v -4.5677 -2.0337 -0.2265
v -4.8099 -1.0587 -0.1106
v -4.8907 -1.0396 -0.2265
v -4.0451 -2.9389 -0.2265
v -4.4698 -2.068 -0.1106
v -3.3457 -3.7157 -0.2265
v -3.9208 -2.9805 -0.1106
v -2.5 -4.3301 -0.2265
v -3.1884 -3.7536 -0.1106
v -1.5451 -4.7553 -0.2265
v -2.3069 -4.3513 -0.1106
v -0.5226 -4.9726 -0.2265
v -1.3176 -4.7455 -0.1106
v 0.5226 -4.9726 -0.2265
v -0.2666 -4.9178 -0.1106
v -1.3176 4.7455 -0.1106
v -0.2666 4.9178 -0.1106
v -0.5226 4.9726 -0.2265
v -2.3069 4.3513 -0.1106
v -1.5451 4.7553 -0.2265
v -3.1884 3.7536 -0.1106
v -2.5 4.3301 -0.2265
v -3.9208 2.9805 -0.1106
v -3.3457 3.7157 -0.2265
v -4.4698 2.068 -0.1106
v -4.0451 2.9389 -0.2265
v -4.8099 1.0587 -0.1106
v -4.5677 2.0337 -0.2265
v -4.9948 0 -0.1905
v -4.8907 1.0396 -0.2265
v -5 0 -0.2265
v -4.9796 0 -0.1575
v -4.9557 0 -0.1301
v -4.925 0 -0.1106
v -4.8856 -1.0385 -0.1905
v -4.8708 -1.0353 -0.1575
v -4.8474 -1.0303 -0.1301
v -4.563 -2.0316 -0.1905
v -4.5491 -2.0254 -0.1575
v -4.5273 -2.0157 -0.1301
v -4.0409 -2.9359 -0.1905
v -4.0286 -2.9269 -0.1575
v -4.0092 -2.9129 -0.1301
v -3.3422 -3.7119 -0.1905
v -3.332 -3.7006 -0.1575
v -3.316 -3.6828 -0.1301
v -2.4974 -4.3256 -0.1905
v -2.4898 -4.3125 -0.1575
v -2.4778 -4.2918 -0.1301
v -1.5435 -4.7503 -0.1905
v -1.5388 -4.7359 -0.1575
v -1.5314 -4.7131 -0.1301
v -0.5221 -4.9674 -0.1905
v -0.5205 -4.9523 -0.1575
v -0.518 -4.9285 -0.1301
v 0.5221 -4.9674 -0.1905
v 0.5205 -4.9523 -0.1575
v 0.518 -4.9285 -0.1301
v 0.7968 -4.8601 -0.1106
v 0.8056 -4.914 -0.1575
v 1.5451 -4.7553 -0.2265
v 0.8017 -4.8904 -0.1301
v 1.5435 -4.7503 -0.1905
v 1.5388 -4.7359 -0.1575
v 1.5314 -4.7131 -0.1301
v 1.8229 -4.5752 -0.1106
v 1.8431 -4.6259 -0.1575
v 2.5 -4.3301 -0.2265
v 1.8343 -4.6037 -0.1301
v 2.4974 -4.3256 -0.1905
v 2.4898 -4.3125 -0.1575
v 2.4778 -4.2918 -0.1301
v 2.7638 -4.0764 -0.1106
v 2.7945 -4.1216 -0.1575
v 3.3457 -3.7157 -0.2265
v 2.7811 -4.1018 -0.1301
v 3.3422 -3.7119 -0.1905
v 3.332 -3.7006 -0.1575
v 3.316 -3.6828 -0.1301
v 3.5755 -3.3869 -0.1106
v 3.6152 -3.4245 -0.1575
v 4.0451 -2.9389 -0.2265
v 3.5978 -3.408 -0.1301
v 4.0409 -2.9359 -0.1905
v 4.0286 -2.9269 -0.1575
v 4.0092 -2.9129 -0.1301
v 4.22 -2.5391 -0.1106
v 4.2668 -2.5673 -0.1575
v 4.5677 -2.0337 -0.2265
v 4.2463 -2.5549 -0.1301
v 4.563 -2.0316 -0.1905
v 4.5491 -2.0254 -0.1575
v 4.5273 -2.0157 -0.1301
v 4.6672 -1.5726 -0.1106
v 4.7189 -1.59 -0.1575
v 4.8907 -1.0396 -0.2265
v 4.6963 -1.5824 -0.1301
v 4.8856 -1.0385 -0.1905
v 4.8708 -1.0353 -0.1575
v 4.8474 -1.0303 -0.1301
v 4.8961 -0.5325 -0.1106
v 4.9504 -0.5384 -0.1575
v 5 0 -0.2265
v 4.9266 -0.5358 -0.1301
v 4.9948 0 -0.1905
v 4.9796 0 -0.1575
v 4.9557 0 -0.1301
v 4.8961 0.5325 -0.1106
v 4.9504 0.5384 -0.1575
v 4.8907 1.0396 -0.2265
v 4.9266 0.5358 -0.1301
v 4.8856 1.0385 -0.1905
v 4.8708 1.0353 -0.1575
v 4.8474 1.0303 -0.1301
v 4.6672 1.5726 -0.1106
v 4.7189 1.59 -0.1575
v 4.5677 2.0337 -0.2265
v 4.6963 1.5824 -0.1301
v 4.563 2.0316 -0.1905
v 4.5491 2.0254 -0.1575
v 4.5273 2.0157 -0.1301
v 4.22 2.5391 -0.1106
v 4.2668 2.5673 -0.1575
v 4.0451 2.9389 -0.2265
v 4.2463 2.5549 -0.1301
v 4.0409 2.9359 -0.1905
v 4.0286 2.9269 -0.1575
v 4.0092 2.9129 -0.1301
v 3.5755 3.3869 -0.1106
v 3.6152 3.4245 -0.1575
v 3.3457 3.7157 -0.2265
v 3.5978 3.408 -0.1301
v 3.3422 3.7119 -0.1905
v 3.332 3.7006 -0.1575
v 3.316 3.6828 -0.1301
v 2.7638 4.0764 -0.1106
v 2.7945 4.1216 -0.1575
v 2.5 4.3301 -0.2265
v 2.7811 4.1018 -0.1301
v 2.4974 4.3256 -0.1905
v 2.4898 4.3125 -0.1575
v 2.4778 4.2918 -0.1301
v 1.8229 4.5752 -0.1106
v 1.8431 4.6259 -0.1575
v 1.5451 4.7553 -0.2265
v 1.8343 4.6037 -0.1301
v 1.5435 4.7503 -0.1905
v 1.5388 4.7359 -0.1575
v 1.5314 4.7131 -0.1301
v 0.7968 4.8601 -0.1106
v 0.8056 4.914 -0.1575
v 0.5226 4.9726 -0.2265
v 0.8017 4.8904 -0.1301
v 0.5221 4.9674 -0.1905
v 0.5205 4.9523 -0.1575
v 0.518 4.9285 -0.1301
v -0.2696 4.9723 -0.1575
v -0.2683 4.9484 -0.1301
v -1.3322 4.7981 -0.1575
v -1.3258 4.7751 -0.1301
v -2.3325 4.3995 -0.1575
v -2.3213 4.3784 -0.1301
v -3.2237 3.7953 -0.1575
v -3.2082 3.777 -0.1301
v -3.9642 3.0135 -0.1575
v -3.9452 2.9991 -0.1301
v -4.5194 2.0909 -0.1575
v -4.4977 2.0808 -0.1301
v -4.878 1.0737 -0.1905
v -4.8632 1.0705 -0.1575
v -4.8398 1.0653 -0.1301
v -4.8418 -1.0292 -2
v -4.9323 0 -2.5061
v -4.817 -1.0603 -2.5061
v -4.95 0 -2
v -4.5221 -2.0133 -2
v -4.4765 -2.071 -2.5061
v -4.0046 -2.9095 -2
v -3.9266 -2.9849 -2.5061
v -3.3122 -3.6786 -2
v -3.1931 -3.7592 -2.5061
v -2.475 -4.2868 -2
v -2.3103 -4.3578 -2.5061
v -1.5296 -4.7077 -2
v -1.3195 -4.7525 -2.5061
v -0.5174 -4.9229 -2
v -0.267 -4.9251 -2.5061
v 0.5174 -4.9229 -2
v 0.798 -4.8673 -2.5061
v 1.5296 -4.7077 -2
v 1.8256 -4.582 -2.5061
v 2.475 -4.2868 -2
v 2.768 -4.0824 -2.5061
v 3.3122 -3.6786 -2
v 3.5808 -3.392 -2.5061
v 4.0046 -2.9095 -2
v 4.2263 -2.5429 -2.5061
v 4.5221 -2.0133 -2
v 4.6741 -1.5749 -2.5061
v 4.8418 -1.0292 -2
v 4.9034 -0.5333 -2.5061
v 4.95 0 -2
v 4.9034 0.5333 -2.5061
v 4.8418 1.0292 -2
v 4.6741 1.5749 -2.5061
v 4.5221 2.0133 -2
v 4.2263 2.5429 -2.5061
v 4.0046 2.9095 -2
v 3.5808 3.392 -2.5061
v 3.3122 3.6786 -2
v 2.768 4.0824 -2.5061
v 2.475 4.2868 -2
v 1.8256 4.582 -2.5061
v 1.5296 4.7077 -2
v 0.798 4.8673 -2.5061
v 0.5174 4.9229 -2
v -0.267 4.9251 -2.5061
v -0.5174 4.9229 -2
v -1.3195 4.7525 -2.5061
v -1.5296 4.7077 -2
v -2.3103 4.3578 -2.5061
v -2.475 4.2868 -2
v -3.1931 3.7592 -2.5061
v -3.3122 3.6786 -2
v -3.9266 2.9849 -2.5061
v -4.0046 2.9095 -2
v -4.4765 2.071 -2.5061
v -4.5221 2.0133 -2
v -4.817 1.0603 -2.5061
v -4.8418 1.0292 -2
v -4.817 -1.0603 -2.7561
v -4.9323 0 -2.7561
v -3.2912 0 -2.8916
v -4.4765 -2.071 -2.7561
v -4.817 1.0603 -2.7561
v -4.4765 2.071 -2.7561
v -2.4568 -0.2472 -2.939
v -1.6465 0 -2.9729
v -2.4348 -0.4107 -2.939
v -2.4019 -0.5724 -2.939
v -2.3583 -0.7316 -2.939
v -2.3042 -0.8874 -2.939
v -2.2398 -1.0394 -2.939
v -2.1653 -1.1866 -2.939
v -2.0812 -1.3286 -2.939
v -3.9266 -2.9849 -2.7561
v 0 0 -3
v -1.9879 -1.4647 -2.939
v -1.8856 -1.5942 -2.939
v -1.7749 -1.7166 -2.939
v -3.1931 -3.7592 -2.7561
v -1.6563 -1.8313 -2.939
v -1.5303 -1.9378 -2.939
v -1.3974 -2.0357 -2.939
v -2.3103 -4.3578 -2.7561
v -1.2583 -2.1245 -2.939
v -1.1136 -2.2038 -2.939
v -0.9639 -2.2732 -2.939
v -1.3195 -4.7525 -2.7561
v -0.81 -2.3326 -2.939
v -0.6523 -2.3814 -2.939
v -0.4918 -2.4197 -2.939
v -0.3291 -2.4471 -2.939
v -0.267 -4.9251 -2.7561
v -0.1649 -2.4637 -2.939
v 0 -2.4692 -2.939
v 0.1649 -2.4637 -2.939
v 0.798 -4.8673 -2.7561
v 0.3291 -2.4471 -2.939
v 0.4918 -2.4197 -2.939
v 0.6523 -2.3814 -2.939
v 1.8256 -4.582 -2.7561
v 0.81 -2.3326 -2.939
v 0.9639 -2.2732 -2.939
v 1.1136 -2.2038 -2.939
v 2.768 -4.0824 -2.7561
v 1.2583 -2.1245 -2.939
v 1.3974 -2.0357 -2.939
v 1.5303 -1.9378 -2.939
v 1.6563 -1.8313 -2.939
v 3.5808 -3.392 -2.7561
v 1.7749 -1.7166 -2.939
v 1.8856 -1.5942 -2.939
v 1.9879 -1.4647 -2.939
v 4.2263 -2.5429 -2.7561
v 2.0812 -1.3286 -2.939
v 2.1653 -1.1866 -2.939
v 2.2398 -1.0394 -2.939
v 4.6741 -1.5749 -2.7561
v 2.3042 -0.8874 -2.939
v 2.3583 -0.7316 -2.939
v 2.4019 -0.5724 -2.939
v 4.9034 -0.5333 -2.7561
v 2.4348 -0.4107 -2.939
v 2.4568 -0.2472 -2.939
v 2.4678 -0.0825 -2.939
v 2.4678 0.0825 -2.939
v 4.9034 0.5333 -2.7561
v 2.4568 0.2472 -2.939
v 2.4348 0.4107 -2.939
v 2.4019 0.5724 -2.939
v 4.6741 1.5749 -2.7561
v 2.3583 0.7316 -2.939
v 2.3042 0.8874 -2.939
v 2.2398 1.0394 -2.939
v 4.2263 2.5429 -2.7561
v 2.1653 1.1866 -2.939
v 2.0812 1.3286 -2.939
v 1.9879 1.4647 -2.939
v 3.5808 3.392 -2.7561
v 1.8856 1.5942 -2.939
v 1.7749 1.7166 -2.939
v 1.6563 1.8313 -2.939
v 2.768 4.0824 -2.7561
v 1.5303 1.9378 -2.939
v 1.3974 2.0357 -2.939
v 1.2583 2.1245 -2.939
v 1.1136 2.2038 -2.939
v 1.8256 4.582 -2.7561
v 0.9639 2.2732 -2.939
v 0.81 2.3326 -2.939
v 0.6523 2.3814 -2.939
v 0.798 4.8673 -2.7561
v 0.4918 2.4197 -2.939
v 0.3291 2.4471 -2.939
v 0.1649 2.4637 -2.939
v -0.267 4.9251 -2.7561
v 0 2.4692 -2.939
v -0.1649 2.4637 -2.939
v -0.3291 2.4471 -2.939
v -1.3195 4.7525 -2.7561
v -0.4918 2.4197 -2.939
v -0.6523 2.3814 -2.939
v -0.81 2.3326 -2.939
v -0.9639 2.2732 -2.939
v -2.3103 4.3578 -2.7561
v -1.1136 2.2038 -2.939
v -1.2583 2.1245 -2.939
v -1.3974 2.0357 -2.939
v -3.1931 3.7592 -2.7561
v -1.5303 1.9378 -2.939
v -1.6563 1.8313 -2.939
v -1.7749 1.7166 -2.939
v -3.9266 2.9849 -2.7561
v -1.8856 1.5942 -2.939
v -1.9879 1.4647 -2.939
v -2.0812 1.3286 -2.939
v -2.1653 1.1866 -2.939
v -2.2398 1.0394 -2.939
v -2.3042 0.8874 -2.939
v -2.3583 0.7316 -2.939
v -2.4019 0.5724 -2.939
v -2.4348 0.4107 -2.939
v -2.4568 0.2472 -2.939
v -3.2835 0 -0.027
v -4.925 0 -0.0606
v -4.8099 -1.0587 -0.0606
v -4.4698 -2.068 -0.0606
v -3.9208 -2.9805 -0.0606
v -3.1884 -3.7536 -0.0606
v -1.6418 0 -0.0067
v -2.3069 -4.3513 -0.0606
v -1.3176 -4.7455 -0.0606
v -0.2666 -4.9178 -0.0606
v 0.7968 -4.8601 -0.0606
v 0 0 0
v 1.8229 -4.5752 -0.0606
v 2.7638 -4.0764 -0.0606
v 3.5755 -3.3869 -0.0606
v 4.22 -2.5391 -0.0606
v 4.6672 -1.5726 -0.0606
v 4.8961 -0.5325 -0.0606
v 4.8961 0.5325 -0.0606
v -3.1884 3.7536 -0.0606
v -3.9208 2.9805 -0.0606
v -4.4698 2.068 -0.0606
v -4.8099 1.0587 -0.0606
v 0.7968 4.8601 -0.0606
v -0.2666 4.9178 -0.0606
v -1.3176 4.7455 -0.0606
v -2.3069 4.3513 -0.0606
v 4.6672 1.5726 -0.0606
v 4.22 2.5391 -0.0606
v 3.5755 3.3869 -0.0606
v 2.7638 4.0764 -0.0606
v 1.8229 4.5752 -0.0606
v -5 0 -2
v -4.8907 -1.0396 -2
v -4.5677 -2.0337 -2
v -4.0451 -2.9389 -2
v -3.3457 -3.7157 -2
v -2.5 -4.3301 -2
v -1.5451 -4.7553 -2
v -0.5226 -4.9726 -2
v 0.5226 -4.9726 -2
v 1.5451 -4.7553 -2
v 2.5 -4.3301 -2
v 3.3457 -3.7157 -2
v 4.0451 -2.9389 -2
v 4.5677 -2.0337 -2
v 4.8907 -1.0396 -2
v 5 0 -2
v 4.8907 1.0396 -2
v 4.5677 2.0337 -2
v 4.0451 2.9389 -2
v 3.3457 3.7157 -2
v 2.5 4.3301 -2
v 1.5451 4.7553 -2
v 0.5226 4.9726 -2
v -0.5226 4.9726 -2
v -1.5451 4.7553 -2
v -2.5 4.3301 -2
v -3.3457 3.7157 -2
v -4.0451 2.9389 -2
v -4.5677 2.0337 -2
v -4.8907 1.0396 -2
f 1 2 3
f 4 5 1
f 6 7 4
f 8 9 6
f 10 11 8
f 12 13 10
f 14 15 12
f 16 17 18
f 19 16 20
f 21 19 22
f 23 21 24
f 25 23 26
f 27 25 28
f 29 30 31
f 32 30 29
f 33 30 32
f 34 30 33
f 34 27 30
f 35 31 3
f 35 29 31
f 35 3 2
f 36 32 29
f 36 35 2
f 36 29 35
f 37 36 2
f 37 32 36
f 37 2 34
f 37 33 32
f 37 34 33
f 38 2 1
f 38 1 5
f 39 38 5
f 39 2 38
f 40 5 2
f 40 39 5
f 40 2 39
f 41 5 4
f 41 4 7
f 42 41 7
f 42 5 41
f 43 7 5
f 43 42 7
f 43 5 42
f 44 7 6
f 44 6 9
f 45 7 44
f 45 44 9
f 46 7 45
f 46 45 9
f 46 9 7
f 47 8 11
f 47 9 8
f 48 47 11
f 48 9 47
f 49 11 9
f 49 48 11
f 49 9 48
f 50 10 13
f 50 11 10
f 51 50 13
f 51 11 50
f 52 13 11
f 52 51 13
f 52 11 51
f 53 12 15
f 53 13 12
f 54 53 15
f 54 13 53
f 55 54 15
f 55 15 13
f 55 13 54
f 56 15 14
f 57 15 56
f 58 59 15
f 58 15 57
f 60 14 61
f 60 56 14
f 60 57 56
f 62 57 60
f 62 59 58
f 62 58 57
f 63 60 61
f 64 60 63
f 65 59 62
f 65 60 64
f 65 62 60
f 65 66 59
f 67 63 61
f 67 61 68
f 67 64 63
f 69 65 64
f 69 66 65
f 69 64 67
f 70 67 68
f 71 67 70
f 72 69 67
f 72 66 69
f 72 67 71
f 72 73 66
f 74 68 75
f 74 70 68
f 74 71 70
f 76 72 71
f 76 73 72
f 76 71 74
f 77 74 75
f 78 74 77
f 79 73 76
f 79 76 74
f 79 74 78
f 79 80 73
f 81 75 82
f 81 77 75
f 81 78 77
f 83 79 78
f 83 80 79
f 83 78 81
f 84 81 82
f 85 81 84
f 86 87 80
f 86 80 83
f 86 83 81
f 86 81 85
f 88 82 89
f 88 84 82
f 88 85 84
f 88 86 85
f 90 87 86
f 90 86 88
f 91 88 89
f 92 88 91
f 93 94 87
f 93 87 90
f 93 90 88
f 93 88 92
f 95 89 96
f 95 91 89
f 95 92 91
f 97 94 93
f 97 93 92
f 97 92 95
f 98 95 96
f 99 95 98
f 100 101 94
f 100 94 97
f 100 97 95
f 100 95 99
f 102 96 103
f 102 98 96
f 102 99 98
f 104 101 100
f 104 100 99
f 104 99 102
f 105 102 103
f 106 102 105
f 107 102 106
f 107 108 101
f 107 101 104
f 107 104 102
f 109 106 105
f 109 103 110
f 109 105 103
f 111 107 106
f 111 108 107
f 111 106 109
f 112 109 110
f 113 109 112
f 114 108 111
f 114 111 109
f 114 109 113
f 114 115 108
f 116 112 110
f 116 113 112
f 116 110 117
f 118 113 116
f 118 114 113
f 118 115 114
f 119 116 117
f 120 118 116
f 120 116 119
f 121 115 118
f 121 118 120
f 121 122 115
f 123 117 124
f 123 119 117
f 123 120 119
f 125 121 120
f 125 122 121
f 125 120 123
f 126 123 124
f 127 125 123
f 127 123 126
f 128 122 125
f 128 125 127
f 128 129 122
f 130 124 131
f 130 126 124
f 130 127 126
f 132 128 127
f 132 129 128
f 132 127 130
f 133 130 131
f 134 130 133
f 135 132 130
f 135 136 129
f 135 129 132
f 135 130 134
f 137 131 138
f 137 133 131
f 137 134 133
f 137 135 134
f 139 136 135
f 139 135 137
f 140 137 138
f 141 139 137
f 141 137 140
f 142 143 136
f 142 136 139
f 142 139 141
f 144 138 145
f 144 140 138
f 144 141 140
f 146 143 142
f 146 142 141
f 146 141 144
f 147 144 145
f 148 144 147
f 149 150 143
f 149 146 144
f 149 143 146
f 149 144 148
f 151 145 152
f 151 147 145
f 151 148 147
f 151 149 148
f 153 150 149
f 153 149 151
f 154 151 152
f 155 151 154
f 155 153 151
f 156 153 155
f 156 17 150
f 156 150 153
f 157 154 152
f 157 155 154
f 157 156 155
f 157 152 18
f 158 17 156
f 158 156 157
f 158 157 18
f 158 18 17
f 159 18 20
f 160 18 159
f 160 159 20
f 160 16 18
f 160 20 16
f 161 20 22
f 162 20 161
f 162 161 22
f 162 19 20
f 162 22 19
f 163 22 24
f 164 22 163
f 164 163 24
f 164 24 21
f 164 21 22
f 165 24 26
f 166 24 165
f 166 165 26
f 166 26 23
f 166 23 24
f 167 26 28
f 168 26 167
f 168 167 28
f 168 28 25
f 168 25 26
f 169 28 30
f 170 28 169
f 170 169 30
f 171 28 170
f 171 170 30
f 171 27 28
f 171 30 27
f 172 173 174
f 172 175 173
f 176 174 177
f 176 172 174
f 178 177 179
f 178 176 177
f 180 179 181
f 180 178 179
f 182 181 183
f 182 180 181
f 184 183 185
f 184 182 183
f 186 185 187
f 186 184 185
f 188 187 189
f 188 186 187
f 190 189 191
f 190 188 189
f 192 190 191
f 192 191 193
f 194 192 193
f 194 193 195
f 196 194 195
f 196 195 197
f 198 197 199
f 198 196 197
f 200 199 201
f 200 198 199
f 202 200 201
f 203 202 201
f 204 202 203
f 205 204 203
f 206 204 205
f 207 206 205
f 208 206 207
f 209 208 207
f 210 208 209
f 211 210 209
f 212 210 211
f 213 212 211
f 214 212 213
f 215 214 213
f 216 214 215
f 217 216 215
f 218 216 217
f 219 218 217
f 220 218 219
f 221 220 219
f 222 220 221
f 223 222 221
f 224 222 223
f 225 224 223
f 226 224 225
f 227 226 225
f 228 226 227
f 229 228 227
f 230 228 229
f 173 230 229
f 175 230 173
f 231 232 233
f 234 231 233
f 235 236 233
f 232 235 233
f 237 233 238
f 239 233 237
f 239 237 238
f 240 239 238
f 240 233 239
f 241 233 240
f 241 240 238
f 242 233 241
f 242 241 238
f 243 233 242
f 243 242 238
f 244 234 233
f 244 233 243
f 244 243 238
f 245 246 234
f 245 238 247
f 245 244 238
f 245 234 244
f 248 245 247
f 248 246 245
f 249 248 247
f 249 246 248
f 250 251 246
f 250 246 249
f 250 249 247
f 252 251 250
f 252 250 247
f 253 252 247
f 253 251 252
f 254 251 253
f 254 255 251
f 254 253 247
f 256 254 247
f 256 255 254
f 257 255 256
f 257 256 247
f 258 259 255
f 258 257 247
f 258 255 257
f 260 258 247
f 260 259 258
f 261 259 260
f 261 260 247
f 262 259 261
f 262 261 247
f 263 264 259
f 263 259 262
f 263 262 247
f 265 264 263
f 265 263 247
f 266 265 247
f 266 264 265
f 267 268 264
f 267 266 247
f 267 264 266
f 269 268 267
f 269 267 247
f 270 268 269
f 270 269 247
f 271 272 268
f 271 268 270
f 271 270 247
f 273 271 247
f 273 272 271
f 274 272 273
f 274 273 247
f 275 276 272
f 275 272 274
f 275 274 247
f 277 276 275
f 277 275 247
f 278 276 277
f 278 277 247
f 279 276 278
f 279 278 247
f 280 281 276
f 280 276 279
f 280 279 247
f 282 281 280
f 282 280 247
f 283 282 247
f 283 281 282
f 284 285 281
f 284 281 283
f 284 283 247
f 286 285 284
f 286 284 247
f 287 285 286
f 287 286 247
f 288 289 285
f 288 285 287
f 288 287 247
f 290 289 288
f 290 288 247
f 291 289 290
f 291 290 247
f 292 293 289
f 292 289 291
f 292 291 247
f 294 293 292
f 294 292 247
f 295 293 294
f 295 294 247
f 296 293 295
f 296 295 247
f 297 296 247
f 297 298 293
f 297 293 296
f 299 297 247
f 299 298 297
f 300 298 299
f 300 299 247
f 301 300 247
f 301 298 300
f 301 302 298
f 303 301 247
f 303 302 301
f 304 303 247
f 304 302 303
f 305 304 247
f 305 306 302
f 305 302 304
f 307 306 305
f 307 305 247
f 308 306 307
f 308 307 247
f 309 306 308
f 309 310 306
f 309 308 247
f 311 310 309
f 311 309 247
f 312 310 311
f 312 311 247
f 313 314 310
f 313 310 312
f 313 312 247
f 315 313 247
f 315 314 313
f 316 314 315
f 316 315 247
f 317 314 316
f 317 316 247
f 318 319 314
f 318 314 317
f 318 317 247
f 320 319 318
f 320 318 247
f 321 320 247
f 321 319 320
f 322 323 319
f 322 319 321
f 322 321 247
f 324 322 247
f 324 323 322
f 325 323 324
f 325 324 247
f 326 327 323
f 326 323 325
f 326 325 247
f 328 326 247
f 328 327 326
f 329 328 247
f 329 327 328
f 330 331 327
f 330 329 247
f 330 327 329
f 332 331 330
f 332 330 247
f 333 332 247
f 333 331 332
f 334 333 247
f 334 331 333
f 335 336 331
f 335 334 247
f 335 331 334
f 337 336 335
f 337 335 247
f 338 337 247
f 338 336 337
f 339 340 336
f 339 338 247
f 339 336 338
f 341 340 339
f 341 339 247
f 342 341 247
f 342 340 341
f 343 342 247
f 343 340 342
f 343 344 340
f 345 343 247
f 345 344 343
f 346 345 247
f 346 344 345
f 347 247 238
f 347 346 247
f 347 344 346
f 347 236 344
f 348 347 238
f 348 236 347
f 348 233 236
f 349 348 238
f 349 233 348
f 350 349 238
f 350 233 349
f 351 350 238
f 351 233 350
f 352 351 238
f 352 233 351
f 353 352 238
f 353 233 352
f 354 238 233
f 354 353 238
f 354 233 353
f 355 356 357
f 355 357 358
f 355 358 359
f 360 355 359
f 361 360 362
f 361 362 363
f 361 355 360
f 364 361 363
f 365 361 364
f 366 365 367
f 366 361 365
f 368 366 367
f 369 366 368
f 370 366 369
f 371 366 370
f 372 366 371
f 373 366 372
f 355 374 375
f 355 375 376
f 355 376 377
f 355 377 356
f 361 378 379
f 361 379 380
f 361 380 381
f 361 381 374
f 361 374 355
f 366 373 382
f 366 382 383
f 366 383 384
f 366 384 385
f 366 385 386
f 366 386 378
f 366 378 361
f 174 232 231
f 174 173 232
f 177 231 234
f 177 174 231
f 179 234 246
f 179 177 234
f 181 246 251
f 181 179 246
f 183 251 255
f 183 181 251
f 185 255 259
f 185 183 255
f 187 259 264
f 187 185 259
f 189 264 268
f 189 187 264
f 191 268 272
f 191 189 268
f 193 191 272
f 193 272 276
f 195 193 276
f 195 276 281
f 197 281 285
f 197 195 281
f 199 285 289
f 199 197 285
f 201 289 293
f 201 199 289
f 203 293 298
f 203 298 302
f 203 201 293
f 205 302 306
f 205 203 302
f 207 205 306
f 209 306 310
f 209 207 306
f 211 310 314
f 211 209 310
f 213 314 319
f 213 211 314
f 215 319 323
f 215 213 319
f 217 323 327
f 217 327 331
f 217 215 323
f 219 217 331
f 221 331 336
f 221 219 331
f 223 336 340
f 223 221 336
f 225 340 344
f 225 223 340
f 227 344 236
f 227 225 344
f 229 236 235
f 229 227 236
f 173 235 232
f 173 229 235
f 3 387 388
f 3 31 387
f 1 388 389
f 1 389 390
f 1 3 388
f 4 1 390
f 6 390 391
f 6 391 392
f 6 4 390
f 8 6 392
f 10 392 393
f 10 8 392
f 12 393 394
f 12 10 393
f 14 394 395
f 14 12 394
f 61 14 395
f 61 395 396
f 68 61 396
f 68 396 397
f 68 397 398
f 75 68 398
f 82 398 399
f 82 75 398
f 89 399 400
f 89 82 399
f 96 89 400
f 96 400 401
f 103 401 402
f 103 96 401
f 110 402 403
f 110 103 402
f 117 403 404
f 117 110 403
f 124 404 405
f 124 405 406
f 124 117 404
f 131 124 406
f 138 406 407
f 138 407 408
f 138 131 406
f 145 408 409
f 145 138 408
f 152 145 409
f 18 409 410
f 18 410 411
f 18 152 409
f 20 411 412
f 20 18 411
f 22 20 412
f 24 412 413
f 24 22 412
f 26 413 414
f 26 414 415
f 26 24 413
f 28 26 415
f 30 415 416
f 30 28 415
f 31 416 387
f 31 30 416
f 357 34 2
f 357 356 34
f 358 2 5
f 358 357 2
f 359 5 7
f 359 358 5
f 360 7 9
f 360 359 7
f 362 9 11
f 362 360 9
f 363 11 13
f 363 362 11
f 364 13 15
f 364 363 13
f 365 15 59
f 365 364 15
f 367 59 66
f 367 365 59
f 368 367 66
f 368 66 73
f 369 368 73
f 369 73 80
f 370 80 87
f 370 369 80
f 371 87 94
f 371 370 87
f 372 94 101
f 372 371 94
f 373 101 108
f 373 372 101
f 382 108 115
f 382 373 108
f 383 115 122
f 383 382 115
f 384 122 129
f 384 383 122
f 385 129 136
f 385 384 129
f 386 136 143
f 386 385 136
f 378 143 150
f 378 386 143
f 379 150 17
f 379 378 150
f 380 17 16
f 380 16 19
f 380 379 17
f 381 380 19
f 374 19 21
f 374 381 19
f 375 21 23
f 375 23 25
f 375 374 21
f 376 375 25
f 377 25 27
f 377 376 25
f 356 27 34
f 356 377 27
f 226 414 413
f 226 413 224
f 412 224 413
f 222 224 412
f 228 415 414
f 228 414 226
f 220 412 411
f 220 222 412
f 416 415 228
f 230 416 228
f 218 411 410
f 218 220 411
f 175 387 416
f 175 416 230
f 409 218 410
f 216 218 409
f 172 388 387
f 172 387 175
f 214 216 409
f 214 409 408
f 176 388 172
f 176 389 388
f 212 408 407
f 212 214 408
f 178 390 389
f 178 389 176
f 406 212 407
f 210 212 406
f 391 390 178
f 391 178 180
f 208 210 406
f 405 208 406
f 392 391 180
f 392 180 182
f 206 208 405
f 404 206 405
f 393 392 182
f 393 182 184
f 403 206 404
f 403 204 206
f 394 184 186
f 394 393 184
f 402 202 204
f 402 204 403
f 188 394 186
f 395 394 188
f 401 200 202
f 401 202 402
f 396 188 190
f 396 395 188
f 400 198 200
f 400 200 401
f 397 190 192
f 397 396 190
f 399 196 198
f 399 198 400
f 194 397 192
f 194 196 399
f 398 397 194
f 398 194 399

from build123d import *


with BuildPart() as part:
    # Sketch1 → Revolve1 (revolve)
    with BuildSketch(Plane(origin=(0, 0, 0), x_dir=(0, 0, -1), z_dir=(1, 0, 0)), mode=Mode.PRIVATE) as revolve1_sk:
        with BuildLine():
            Line((0, 0), (3, 0))
            ThreePointArc((3, 0), (2.938994507, 2.469175495), (2.756126895, 4.932325659))
            Line((2.756126895, 4.932325659), (2.506126895, 4.932325659))
            Line((2.506126895, 4.932325659), (2, 4.95))
            Line((2, 4.95), (2, 5))
            Line((2, 5), (0.22651456, 5))
            ThreePointArc((0.22651456, 5), (0.157503692, 4.979613789), (0.110648258, 4.925))
            Line((0.110648258, 4.925), (0.060648258, 4.925))
            ThreePointArc((0.060648258, 4.925), (0.015162639, 2.462686704), (0, 0))
        make_face()
    revolve(revolve1_sk.sketch.rotate(Axis((0, 0, -7.414080755), (0, 0, 1)), 90), axis=Axis((0, 0, -7.414080755), (0, 0, 1)))


solid = part.part
